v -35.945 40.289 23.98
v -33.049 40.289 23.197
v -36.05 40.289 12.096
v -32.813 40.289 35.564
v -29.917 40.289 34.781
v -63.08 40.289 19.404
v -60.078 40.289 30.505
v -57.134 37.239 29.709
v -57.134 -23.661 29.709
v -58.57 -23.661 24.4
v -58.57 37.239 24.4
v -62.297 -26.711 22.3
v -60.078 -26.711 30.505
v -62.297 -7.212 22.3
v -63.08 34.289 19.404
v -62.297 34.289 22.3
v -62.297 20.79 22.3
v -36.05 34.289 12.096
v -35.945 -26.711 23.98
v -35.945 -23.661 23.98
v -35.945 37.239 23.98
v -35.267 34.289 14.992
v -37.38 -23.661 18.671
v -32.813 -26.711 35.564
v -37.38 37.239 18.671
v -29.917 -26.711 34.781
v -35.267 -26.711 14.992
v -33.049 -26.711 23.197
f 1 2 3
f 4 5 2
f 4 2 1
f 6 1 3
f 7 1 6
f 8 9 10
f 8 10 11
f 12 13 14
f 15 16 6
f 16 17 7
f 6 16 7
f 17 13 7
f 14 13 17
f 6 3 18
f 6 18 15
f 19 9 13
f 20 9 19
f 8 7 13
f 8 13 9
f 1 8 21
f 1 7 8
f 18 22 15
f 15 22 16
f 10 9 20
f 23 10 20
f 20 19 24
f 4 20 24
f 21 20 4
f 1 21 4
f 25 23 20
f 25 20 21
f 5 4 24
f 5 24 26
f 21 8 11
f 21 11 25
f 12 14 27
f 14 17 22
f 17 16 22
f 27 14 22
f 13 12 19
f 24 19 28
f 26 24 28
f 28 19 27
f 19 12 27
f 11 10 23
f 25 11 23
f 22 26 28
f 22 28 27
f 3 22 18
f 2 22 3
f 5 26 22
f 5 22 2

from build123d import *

# Parameters (mm, degrees)
CROQUIS1_W              = 52
CROQUIS1_H              = 37
SALIENTE_EXTRUIR1_DEPTH = 3
REDONDEO1_R             = 3
CROQUIS2_R              = 1.5
CORTAR_EXTRUIR1_DEPTH   = 3
CROQUIS3_W              = 29
CROQUIS3_H              = 20
CROQUIS3_W_2            = 6
CROQUIS3_H_2            = 14
CORTAR_EXTRUIR2_DEPTH   = 3
SALIENTE_EXTRUIR2_DEPTH = 9
CROQUIS5_W              = 36
CROQUIS5_H              = 28.002550662
SALIENTE_EXTRUIR3_DEPTH = 10.3
CORTAR_EXTRUIR3_START   = -28.002551
CORTAR_EXTRUIR3_DEPTH   = 28.002551
SALIENTE_EXTRUIR4_DEPTH = 8.5
CROQUIS8_W              = 21.9
CROQUIS8_H              = 60.9
CORTAR_EXTRUIR4_DEPTH   = 5.5
CORTAR_EXTRUIR5_DEPTH   = 9
CORTAR_EXTRUIR6_START   = -28.002551
CROQUIS12_W             = 9
CROQUIS12_H             = 1.570892211
CORTAR_EXTRUIR6_DEPTH   = 28.002551
CROQUIS13_W             = 3
CROQUIS13_H             = 67
SALIENTE_EXTRUIR5_DEPTH = 12
CORTAR_EXTRUIR7_START   = -28.002551
CROQUIS14_W             = 31
CROQUIS14_H             = 9
CORTAR_EXTRUIR7_DEPTH   = 28.002551
CROQUIS17_R             = 1.5
SALIENTE_EXTRUIR6_DEPTH = 9
CORTAR_EXTRUIR8_START   = -37
CROQUIS18_W             = 54.197150846
CROQUIS18_H             = 9
CORTAR_EXTRUIR8_DEPTH   = 37
CROQUIS20_W             = 28
CROQUIS20_H             = 6
SALIENTE_EXTRUIR7_DEPTH = 3
CROQUIS21_W             = 20
CROQUIS21_H             = 4.5
CORTAR_EXTRUIR10_DEPTH  = 2
CROQUIS24_W             = 0.05
CROQUIS24_H             = 60.9
CORTAR_EXTRUIR13_DEPTH  = 5.5
CROQUIS25_W             = 64.228743672
CROQUIS25_H             = 61
CORTAR_EXTRUIR14_DEPTH  = 15
CROQUIS26_W             = 10.904109589
CROQUIS26_H             = 37
CORTAR_EXTRUIR15_DEPTH  = 15


with BuildPart() as part:
    # Croquis1 → Saliente-Extruir1 (new body)
    with BuildSketch(Plane.XY):
        with Locations((-39.296803653, 6.787671233)):
            Rectangle(CROQUIS1_W, CROQUIS1_H)
    extrude(amount=SALIENTE_EXTRUIR1_DEPTH)

    # Redondeo1
    redondeo1_edges = [part.edges().sort_by_distance(p)[0] for p in [
        (-65.296803653, 25.287671233, 1.5),
        (-65.296803653, -11.712328767, 1.5),
    ]]
    fillet(redondeo1_edges, radius=REDONDEO1_R)

    # Croquis2 → Cortar-Extruir1 (cut)
    with BuildSketch(Plane.XY.offset(3)):
        with Locations((-61.296803653, 21.287671233)):
            Circle(CROQUIS2_R)
        with Locations((-61.296803653, -7.712328767)):
            Circle(CROQUIS2_R)
        with Locations((-16.624072342, -7.712328767)):
            Circle(CROQUIS2_R)
        with Locations((-17.296803653, 21.287671233)):
            Circle(CROQUIS2_R)
    extrude(amount=-CORTAR_EXTRUIR1_DEPTH, mode=Mode.SUBTRACT)

    # Croquis3 → Cortar-Extruir2 (cut)
    with BuildSketch(Plane.XY.offset(3)):
        with Locations((-50.796803653, 6.787671233)):
            Rectangle(CROQUIS3_W, CROQUIS3_H)
        with Locations((-16.296803653, 6.787671233)):
            Rectangle(CROQUIS3_W_2, CROQUIS3_H_2)
    extrude(amount=-CORTAR_EXTRUIR2_DEPTH, mode=Mode.SUBTRACT)

    # Croquis4 → Saliente-Extruir2 (add)
    with BuildSketch(Plane.XY.offset(3)):
        Polygon((-57.296803653, 16.787671233), (-57.296803653, 20.790221895), (-26.296803653, 20.790221895), (-26.296803653, -7.212328767), (-57.296803653, -7.212328767), (-57.296803653, -3.212328767), (-36.296803653, -3.212328767), (-36.296803653, 16.787671233), align=None)
    extrude(amount=SALIENTE_EXTRUIR2_DEPTH)

    # Croquis5 → Saliente-Extruir3 (add)
    with BuildSketch(Plane.XY.offset(12)):
        with Locations((-44.296803653, 6.788946564)):
            Rectangle(CROQUIS5_W, CROQUIS5_H)
    extrude(amount=SALIENTE_EXTRUIR3_DEPTH)

    # Croquis6 → Cortar-Extruir3 (cut)
    with BuildSketch(Plane.XZ.offset(7.212328767).offset(CORTAR_EXTRUIR3_START)):
        Polygon((-35.296803653, 15), (-35.296803653, 12.995381041), (-26.296803653, 12.995381041), (-26.296803653, 14.757444162), (-26.296803653, 22.3), (-62.296803653, 22.3), align=None)
    extrude(amount=CORTAR_EXTRUIR3_DEPTH, mode=Mode.SUBTRACT)

    # Croquis7 → Saliente-Extruir4 (add)
    with BuildSketch(Plane(origin=(1.374852463, 0, 5.085070754), x_dir=(0.9653390502996949, 0, -0.2609990765625102), z_dir=(0.2609990765625102, 0, 0.9653390502996949))):
        Polygon((-65.957816682, 6.788946564), (-65.957816682, -26.711053436), (-37.957816682, -26.711053436), (-37.957816682, 40.288946564), (-65.957816682, 40.288946564), align=None)
    extrude(amount=SALIENTE_EXTRUIR4_DEPTH)

    # Croquis8 → Cortar-Extruir4 (cut)
    with BuildSketch(Plane(origin=(3.593344614, 0, 13.290452681), x_dir=(0.9653390502996949, 0, -0.26099907656251026), z_dir=(0.26099907656251026, 0, 0.9653390502996949))):
        with Locations((-51.957816682, 6.788946564)):
            Rectangle(CROQUIS8_W, CROQUIS8_H)
    extrude(amount=-CORTAR_EXTRUIR4_DEPTH, mode=Mode.SUBTRACT)

    # Croquis10 → Cortar-Extruir5 (cut)
    with BuildSketch(Plane(origin=(0, 20.790221895, 0), x_dir=(1, 0, 0), z_dir=(0, 1, 0))):
        Polygon((-62.296803653, -22.3), (-35.296803653, -15), (-35.296803653, -12), (-62.296803653, -19.3), align=None)
    extrude(amount=-CORTAR_EXTRUIR5_DEPTH, mode=Mode.SUBTRACT)

    # Croquis12 → Cortar-Extruir6 (cut)
    with BuildSketch(Plane(origin=(0, 20.790221895, 0), x_dir=(1, 0, 0), z_dir=(0, 1, 0)).offset(CORTAR_EXTRUIR6_START)):
        with Locations((-30.796803653, -12.209934936)):
            Rectangle(CROQUIS12_W, CROQUIS12_H)
    extrude(amount=CORTAR_EXTRUIR6_DEPTH, mode=Mode.SUBTRACT)

    # Croquis13 → Saliente-Extruir5 (add)
    with BuildSketch(Plane(origin=(3.593344614, 0, 13.290452681), x_dir=(0.9653390502996949, 0, -0.26099907656251026), z_dir=(0.26099907656251026, 0, 0.9653390502996949))):
        with Locations((-39.457816682, 6.788946564)):
            Rectangle(CROQUIS13_W, CROQUIS13_H)
    extrude(amount=SALIENTE_EXTRUIR5_DEPTH)

    # Croquis14 → Cortar-Extruir7 (cut)
    with BuildSketch(Plane.XZ.offset(7.212328767).offset(CORTAR_EXTRUIR7_START)):
        with Locations((-41.796803653, 7.5)):
            Rectangle(CROQUIS14_W, CROQUIS14_H)
    extrude(amount=CORTAR_EXTRUIR7_DEPTH, mode=Mode.SUBTRACT)


with BuildPart() as cortar_extruir7_piece_1:
    # of the separate pieces the step leaves, piece 1, a body of its own (cortar_extruir7_pieces)
    add(part.part.solids().sort_by_distance((-62.296803653, -26.711053436, 22.3))[0])



with BuildPart() as cortar_extruir7_piece_2:
    # of the separate pieces the step leaves, piece 2, a body of its own (cortar_extruir7_pieces)
    add(part.part.solids().sort_by_distance((-62.296803653, 25.287671233, 3))[0])


with BuildPart() as cortar_extruir7_piece_1_1:
    add(cortar_extruir7_piece_1.part)

    add(cortar_extruir7_piece_2.part)  # Saliente-Extruir6 merges Cortar-Extruir7 piece 2
    # Croquis17 → Saliente-Extruir6 (add)
    with BuildSketch(Plane.XY.offset(3)):
        with BuildLine():
            Line((-13.296803653, -0.212328767), (-19.296803653, -0.212328767))
            Line((-19.296803653, -0.212328767), (-19.296803653, 13.787671233))
            Line((-19.296803653, 13.787671233), (-13.296803653, 13.787671233))
            Line((-13.296803653, 13.787671233), (-13.296803653, 25.287671233))
            Line((-13.296803653, 25.287671233), (-62.296803653, 25.287671233))
            ThreePointArc((-62.296803653, 25.287671233), (-64.418123997, 24.408991576), (-65.296803653, 22.287671233))
            Line((-65.296803653, 22.287671233), (-65.296803653, 16.787671233))
            Line((-65.296803653, 16.787671233), (-36.296803653, 16.787671233))
            Line((-36.296803653, 16.787671233), (-36.296803653, -3.212328767))
            Line((-36.296803653, -3.212328767), (-65.296803653, -3.212328767))
            Line((-65.296803653, -3.212328767), (-65.296803653, -8.712328767))
            ThreePointArc((-65.296803653, -8.712328767), (-64.418123997, -10.833649111), (-62.296803653, -11.712328767))
            Line((-62.296803653, -11.712328767), (-13.296803653, -11.712328767))
            Line((-13.296803653, -11.712328767), (-13.296803653, -0.212328767))
        make_face()
        with Locations((-61.296803653, 21.287671233)):
            Circle(CROQUIS17_R, mode=Mode.SUBTRACT)
        with Locations((-61.296803653, -7.712328767)):
            Circle(CROQUIS17_R, mode=Mode.SUBTRACT)
        with Locations((-16.624072342, -7.712328767)):
            Circle(CROQUIS17_R, mode=Mode.SUBTRACT)
        with Locations((-17.296803653, 21.287671233)):
            Circle(CROQUIS17_R, mode=Mode.SUBTRACT)
    extrude(amount=SALIENTE_EXTRUIR6_DEPTH)

    # Croquis18 → Cortar-Extruir8 (cut)
    with BuildSketch(Plane.XZ.offset(11.712328767).offset(CORTAR_EXTRUIR8_START)):
        with Locations((-40.395379076, 4.5)):
            Rectangle(CROQUIS18_W, CROQUIS18_H)
    extrude(amount=CORTAR_EXTRUIR8_DEPTH, mode=Mode.SUBTRACT)

    # Croquis20 → Saliente-Extruir7 (add)
    with BuildSketch(Plane(origin=(1.374852463, 0, 5.085070754), x_dir=(-0.9653390502996949, 0, 0.26099907656251026), z_dir=(-0.26099907656251026, 0, -0.9653390502996949))):
        with Locations((51.957816682, 37.288946564)):
            Rectangle(CROQUIS20_W, CROQUIS20_H)
    extrude(amount=SALIENTE_EXTRUIR7_DEPTH)

    # Croquis21 → Cortar-Extruir10 (cut)
    with BuildSketch(Plane(origin=(0, 0, 9), x_dir=(-1, 0, 0), z_dir=(0, 0, -1))):
        with Locations((45.296803653, 19.037671233)):
            Rectangle(CROQUIS21_W, CROQUIS21_H)
        with Locations((45.296803653, -5.462328767)):
            Rectangle(CROQUIS21_W, CROQUIS21_H)
    extrude(amount=-CORTAR_EXTRUIR10_DEPTH, mode=Mode.SUBTRACT)

    # Croquis24 → Cortar-Extruir13 (cut)
    with BuildSketch(Plane(origin=(3.593344614, 0, 13.290452681), x_dir=(0.9653390502996949, 0, -0.26099907656251026), z_dir=(0.26099907656251026, 0, 0.9653390502996949))):
        with Locations((-40.982816682, 6.788946564)):
            Rectangle(CROQUIS24_W, CROQUIS24_H)
    extrude(amount=-CORTAR_EXTRUIR13_DEPTH, mode=Mode.SUBTRACT)

    # Croquis25 → Cortar-Extruir14 (cut)
    with BuildSketch(Plane(origin=(1.374852463, 0, 5.085070754), x_dir=(-0.9653390502996949, 0, 0.26099907656251026), z_dir=(-0.26099907656251026, 0, -0.9653390502996949))):
        with Locations((45.297379558, 3.788946564)):
            Rectangle(CROQUIS25_W, CROQUIS25_H)
    extrude(amount=CORTAR_EXTRUIR14_DEPTH, mode=Mode.SUBTRACT)


with BuildPart() as cortar_extruir14_piece_1:
    # of the separate pieces the step leaves, piece 1, a body of its own (cortar_extruir14_pieces)
    add(cortar_extruir7_piece_1_1.part.solids().sort_by_distance((-62.296803653, -26.711053436, 22.3))[0])


with BuildPart() as cortar_extruir14_piece_2:
    # of the separate pieces the step leaves, piece 2, a body of its own (cortar_extruir14_pieces)
    add(cortar_extruir7_piece_1_1.part.solids().sort_by_distance((-24.200913242, -11.712328767, 12))[0])

    # Croquis26 → Cortar-Extruir15 (cut)
    with BuildSketch(Plane.XY.offset(12)):
        with Locations((-18.748858448, 6.787671233)):
            Rectangle(CROQUIS26_W, CROQUIS26_H)
    extrude(amount=-CORTAR_EXTRUIR15_DEPTH, mode=Mode.SUBTRACT)


solid = cortar_extruir14_piece_1.part
